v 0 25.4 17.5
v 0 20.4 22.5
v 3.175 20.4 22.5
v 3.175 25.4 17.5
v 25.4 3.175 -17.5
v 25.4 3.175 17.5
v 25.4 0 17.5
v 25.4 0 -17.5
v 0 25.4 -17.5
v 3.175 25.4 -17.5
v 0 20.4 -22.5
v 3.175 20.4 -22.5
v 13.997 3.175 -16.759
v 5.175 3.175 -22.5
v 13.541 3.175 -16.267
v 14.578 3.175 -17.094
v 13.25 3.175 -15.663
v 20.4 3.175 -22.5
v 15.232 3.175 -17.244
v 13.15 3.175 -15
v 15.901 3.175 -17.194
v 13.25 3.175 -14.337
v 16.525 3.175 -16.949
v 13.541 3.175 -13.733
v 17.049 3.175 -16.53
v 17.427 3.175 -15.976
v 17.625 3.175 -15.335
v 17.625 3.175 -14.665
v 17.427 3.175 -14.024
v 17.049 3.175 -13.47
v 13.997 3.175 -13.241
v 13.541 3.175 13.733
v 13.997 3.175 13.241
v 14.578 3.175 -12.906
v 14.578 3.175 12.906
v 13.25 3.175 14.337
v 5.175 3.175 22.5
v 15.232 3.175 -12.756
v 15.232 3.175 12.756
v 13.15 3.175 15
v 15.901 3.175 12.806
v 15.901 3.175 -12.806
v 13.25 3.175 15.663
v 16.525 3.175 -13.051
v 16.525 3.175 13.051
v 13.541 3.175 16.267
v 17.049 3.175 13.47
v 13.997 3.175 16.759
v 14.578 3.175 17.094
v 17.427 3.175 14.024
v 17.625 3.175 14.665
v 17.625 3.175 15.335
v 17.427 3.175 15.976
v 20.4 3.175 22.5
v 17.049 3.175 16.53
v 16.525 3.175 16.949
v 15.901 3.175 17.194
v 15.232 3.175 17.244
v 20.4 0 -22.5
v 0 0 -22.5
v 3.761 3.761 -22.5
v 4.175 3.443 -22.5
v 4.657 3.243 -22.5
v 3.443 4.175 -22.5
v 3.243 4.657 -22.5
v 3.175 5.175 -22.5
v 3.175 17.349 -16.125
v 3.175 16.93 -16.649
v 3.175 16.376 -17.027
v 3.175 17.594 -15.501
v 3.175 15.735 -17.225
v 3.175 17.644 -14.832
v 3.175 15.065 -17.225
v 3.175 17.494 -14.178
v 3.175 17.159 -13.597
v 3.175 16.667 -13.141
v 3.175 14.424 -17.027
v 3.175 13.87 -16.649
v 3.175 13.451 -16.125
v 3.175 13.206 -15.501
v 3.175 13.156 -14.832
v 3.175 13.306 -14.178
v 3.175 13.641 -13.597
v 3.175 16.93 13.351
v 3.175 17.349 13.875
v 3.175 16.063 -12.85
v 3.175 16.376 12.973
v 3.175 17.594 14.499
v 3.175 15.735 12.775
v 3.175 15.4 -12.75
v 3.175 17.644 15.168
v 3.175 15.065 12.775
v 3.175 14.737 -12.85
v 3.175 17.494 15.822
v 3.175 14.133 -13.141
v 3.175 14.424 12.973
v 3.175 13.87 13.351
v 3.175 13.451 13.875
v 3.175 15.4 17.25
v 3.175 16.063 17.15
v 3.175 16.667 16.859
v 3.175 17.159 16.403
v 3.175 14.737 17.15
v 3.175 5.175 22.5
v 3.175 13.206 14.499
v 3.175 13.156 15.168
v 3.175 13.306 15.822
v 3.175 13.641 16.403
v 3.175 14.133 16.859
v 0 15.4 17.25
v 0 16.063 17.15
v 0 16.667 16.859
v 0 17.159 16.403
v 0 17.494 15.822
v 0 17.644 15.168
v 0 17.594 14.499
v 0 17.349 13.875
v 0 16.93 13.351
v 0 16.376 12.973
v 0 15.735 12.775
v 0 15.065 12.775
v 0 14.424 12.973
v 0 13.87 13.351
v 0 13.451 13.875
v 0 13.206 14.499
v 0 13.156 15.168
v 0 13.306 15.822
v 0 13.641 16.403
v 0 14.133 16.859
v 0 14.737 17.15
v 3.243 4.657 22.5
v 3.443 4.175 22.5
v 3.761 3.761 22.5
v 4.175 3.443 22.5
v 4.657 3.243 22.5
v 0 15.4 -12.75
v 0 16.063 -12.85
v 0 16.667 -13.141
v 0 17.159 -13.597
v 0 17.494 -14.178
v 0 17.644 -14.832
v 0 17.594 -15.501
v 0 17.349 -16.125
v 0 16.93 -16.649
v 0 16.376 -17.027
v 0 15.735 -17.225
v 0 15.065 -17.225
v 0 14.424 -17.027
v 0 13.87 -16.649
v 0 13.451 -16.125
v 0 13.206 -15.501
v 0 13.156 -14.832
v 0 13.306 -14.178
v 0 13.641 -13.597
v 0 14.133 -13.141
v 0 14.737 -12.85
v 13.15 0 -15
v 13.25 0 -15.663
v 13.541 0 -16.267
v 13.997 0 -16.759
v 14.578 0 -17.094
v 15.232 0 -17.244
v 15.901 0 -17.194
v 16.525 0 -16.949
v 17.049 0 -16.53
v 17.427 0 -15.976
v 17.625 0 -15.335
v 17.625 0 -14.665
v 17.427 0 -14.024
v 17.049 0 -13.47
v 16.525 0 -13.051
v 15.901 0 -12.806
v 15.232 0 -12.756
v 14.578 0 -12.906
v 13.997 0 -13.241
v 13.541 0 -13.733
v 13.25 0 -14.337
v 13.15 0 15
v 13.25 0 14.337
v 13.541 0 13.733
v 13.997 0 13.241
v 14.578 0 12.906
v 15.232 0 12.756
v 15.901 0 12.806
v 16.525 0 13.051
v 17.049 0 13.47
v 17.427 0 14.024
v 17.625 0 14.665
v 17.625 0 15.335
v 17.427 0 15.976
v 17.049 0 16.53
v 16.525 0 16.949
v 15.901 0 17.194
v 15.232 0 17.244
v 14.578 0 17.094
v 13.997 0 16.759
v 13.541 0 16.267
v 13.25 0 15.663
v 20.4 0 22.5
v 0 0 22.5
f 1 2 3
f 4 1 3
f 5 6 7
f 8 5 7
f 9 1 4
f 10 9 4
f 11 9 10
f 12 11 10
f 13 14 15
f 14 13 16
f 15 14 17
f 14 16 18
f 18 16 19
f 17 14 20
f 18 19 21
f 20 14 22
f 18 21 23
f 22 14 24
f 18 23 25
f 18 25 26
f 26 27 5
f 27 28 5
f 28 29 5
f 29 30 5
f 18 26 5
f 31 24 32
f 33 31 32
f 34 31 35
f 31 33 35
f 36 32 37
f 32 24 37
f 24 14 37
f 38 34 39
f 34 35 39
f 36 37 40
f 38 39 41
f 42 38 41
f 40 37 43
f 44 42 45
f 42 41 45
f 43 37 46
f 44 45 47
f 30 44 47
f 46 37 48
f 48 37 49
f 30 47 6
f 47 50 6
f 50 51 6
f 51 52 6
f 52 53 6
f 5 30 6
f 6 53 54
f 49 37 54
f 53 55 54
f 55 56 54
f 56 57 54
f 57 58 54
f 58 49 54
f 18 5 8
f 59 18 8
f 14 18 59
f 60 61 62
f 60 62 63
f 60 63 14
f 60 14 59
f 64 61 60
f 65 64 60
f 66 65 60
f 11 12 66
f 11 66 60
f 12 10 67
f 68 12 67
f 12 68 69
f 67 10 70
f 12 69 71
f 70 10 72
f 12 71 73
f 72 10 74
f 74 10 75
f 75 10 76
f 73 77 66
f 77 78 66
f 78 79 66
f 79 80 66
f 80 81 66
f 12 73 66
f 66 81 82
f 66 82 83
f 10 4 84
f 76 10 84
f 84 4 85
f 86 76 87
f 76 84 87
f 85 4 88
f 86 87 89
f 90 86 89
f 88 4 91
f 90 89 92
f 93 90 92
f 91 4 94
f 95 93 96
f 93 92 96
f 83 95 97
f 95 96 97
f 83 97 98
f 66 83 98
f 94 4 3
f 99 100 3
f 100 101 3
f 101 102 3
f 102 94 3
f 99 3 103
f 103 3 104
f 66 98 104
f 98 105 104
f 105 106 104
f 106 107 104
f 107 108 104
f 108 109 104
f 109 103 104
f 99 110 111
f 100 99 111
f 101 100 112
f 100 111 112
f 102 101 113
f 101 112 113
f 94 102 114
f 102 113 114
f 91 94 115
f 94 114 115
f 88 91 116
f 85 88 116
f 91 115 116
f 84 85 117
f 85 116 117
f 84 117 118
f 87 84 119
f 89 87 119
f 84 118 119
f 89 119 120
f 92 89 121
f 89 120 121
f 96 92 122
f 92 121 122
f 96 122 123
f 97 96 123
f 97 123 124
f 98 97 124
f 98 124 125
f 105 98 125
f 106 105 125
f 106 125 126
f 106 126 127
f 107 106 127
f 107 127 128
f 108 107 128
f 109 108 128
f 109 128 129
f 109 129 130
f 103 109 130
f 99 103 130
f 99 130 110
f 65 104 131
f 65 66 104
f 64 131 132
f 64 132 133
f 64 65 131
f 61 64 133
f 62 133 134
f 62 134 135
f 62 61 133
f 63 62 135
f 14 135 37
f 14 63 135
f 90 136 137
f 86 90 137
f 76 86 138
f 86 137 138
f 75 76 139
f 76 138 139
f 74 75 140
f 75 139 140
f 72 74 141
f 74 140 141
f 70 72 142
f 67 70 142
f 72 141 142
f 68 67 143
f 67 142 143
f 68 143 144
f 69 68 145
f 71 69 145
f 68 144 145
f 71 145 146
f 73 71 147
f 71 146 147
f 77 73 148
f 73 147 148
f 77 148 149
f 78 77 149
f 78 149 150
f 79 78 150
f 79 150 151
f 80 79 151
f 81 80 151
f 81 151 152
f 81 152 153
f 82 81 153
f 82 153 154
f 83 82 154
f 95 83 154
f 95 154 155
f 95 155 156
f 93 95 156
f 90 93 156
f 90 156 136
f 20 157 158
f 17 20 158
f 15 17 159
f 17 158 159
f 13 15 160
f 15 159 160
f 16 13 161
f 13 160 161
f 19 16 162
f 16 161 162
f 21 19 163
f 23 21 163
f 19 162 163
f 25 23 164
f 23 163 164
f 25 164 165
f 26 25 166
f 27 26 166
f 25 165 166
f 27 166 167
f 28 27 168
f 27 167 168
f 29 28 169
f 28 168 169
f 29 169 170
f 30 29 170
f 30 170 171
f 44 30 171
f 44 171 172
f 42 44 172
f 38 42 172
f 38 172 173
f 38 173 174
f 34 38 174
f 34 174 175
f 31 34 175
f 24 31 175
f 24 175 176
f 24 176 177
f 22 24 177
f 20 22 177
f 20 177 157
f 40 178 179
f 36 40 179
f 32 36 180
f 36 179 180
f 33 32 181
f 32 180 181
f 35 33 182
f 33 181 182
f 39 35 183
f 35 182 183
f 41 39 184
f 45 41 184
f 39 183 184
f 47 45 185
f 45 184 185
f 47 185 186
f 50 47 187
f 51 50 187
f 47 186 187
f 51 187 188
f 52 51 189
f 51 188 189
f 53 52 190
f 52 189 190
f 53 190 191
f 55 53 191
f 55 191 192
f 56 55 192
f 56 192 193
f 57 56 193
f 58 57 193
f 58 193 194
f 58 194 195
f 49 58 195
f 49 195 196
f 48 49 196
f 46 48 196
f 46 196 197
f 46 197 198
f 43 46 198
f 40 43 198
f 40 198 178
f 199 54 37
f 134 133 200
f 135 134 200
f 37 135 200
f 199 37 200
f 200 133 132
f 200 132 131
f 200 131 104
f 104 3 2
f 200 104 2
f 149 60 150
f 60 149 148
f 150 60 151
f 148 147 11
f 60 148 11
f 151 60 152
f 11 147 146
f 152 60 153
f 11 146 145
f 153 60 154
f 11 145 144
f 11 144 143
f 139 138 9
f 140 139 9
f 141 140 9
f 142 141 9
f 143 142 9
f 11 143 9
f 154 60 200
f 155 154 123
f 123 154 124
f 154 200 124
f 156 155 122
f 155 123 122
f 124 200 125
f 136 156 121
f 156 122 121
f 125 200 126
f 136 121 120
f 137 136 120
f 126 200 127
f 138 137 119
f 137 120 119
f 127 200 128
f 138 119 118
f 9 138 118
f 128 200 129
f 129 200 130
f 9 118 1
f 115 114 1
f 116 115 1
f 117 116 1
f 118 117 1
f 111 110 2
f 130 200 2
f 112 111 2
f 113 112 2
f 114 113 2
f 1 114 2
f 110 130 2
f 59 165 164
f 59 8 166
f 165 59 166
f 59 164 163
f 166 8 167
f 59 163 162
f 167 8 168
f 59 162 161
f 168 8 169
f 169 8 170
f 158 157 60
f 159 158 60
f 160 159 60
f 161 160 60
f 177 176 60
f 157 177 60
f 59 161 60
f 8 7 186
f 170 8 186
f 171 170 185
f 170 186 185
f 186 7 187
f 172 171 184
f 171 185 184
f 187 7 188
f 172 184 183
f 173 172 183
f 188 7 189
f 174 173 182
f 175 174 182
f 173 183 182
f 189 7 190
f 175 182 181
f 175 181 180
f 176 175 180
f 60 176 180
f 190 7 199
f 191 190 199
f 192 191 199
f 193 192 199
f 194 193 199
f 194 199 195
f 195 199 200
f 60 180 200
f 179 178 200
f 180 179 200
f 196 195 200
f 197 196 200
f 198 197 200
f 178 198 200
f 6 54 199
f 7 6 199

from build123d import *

# Parameters (mm, degrees)
BOSS_EXTRUDE1_DEPTH  = 22.5
M4_CLEARANCE_HOLE1_D = 4.5
M4_CLEARANCE_HOLE2_D = 4.5
FILLET1_R            = 2
CHAMFER1_SIZE        = 5


with BuildPart() as part:
    # Sketch1 → Boss-Extrude1 (new body, symmetric)
    with BuildSketch(Plane.XY):
        Polygon((0, 0), (0, 25.4), (3.175, 25.4), (3.175, 3.175), (25.4, 3.175), (25.4, 0), align=None)
    extrude(amount=BOSS_EXTRUDE1_DEPTH, both=True)

    # M4 Clearance Hole1 (through all)
    with Locations(Plane(origin=(0, 3.175, 0), x_dir=(1, 0, 0), z_dir=(0, 1, 0))):
        with Locations((15.4, 15), (15.4, -15)):
            Hole(M4_CLEARANCE_HOLE1_D / 2)

    # M4 Clearance Hole2 (through all)
    with Locations(Plane(origin=(3.175, 0, 0), x_dir=(0, 0, -1), z_dir=(1, 0, 0))):
        with Locations((-15, 15.4), (15, 15.4)):
            Hole(M4_CLEARANCE_HOLE2_D / 2)

    # Fillet1
    fillet1_edges = [part.edges().sort_by_distance(p)[0] for p in [
        (3.175, 3.175, 0),
    ]]
    fillet(fillet1_edges, radius=FILLET1_R)

    # Chamfer1
    chamfer1_edges = [part.edges().sort_by_distance(p)[0] for p in [
        (1.5875, 25.4, 22.5),
        (1.5875, 25.4, -22.5),
        (25.4, 1.5875, -22.5),
        (25.4, 1.5875, 22.5),
    ]]
    chamfer(chamfer1_edges, length=CHAMFER1_SIZE)


solid = part.part
